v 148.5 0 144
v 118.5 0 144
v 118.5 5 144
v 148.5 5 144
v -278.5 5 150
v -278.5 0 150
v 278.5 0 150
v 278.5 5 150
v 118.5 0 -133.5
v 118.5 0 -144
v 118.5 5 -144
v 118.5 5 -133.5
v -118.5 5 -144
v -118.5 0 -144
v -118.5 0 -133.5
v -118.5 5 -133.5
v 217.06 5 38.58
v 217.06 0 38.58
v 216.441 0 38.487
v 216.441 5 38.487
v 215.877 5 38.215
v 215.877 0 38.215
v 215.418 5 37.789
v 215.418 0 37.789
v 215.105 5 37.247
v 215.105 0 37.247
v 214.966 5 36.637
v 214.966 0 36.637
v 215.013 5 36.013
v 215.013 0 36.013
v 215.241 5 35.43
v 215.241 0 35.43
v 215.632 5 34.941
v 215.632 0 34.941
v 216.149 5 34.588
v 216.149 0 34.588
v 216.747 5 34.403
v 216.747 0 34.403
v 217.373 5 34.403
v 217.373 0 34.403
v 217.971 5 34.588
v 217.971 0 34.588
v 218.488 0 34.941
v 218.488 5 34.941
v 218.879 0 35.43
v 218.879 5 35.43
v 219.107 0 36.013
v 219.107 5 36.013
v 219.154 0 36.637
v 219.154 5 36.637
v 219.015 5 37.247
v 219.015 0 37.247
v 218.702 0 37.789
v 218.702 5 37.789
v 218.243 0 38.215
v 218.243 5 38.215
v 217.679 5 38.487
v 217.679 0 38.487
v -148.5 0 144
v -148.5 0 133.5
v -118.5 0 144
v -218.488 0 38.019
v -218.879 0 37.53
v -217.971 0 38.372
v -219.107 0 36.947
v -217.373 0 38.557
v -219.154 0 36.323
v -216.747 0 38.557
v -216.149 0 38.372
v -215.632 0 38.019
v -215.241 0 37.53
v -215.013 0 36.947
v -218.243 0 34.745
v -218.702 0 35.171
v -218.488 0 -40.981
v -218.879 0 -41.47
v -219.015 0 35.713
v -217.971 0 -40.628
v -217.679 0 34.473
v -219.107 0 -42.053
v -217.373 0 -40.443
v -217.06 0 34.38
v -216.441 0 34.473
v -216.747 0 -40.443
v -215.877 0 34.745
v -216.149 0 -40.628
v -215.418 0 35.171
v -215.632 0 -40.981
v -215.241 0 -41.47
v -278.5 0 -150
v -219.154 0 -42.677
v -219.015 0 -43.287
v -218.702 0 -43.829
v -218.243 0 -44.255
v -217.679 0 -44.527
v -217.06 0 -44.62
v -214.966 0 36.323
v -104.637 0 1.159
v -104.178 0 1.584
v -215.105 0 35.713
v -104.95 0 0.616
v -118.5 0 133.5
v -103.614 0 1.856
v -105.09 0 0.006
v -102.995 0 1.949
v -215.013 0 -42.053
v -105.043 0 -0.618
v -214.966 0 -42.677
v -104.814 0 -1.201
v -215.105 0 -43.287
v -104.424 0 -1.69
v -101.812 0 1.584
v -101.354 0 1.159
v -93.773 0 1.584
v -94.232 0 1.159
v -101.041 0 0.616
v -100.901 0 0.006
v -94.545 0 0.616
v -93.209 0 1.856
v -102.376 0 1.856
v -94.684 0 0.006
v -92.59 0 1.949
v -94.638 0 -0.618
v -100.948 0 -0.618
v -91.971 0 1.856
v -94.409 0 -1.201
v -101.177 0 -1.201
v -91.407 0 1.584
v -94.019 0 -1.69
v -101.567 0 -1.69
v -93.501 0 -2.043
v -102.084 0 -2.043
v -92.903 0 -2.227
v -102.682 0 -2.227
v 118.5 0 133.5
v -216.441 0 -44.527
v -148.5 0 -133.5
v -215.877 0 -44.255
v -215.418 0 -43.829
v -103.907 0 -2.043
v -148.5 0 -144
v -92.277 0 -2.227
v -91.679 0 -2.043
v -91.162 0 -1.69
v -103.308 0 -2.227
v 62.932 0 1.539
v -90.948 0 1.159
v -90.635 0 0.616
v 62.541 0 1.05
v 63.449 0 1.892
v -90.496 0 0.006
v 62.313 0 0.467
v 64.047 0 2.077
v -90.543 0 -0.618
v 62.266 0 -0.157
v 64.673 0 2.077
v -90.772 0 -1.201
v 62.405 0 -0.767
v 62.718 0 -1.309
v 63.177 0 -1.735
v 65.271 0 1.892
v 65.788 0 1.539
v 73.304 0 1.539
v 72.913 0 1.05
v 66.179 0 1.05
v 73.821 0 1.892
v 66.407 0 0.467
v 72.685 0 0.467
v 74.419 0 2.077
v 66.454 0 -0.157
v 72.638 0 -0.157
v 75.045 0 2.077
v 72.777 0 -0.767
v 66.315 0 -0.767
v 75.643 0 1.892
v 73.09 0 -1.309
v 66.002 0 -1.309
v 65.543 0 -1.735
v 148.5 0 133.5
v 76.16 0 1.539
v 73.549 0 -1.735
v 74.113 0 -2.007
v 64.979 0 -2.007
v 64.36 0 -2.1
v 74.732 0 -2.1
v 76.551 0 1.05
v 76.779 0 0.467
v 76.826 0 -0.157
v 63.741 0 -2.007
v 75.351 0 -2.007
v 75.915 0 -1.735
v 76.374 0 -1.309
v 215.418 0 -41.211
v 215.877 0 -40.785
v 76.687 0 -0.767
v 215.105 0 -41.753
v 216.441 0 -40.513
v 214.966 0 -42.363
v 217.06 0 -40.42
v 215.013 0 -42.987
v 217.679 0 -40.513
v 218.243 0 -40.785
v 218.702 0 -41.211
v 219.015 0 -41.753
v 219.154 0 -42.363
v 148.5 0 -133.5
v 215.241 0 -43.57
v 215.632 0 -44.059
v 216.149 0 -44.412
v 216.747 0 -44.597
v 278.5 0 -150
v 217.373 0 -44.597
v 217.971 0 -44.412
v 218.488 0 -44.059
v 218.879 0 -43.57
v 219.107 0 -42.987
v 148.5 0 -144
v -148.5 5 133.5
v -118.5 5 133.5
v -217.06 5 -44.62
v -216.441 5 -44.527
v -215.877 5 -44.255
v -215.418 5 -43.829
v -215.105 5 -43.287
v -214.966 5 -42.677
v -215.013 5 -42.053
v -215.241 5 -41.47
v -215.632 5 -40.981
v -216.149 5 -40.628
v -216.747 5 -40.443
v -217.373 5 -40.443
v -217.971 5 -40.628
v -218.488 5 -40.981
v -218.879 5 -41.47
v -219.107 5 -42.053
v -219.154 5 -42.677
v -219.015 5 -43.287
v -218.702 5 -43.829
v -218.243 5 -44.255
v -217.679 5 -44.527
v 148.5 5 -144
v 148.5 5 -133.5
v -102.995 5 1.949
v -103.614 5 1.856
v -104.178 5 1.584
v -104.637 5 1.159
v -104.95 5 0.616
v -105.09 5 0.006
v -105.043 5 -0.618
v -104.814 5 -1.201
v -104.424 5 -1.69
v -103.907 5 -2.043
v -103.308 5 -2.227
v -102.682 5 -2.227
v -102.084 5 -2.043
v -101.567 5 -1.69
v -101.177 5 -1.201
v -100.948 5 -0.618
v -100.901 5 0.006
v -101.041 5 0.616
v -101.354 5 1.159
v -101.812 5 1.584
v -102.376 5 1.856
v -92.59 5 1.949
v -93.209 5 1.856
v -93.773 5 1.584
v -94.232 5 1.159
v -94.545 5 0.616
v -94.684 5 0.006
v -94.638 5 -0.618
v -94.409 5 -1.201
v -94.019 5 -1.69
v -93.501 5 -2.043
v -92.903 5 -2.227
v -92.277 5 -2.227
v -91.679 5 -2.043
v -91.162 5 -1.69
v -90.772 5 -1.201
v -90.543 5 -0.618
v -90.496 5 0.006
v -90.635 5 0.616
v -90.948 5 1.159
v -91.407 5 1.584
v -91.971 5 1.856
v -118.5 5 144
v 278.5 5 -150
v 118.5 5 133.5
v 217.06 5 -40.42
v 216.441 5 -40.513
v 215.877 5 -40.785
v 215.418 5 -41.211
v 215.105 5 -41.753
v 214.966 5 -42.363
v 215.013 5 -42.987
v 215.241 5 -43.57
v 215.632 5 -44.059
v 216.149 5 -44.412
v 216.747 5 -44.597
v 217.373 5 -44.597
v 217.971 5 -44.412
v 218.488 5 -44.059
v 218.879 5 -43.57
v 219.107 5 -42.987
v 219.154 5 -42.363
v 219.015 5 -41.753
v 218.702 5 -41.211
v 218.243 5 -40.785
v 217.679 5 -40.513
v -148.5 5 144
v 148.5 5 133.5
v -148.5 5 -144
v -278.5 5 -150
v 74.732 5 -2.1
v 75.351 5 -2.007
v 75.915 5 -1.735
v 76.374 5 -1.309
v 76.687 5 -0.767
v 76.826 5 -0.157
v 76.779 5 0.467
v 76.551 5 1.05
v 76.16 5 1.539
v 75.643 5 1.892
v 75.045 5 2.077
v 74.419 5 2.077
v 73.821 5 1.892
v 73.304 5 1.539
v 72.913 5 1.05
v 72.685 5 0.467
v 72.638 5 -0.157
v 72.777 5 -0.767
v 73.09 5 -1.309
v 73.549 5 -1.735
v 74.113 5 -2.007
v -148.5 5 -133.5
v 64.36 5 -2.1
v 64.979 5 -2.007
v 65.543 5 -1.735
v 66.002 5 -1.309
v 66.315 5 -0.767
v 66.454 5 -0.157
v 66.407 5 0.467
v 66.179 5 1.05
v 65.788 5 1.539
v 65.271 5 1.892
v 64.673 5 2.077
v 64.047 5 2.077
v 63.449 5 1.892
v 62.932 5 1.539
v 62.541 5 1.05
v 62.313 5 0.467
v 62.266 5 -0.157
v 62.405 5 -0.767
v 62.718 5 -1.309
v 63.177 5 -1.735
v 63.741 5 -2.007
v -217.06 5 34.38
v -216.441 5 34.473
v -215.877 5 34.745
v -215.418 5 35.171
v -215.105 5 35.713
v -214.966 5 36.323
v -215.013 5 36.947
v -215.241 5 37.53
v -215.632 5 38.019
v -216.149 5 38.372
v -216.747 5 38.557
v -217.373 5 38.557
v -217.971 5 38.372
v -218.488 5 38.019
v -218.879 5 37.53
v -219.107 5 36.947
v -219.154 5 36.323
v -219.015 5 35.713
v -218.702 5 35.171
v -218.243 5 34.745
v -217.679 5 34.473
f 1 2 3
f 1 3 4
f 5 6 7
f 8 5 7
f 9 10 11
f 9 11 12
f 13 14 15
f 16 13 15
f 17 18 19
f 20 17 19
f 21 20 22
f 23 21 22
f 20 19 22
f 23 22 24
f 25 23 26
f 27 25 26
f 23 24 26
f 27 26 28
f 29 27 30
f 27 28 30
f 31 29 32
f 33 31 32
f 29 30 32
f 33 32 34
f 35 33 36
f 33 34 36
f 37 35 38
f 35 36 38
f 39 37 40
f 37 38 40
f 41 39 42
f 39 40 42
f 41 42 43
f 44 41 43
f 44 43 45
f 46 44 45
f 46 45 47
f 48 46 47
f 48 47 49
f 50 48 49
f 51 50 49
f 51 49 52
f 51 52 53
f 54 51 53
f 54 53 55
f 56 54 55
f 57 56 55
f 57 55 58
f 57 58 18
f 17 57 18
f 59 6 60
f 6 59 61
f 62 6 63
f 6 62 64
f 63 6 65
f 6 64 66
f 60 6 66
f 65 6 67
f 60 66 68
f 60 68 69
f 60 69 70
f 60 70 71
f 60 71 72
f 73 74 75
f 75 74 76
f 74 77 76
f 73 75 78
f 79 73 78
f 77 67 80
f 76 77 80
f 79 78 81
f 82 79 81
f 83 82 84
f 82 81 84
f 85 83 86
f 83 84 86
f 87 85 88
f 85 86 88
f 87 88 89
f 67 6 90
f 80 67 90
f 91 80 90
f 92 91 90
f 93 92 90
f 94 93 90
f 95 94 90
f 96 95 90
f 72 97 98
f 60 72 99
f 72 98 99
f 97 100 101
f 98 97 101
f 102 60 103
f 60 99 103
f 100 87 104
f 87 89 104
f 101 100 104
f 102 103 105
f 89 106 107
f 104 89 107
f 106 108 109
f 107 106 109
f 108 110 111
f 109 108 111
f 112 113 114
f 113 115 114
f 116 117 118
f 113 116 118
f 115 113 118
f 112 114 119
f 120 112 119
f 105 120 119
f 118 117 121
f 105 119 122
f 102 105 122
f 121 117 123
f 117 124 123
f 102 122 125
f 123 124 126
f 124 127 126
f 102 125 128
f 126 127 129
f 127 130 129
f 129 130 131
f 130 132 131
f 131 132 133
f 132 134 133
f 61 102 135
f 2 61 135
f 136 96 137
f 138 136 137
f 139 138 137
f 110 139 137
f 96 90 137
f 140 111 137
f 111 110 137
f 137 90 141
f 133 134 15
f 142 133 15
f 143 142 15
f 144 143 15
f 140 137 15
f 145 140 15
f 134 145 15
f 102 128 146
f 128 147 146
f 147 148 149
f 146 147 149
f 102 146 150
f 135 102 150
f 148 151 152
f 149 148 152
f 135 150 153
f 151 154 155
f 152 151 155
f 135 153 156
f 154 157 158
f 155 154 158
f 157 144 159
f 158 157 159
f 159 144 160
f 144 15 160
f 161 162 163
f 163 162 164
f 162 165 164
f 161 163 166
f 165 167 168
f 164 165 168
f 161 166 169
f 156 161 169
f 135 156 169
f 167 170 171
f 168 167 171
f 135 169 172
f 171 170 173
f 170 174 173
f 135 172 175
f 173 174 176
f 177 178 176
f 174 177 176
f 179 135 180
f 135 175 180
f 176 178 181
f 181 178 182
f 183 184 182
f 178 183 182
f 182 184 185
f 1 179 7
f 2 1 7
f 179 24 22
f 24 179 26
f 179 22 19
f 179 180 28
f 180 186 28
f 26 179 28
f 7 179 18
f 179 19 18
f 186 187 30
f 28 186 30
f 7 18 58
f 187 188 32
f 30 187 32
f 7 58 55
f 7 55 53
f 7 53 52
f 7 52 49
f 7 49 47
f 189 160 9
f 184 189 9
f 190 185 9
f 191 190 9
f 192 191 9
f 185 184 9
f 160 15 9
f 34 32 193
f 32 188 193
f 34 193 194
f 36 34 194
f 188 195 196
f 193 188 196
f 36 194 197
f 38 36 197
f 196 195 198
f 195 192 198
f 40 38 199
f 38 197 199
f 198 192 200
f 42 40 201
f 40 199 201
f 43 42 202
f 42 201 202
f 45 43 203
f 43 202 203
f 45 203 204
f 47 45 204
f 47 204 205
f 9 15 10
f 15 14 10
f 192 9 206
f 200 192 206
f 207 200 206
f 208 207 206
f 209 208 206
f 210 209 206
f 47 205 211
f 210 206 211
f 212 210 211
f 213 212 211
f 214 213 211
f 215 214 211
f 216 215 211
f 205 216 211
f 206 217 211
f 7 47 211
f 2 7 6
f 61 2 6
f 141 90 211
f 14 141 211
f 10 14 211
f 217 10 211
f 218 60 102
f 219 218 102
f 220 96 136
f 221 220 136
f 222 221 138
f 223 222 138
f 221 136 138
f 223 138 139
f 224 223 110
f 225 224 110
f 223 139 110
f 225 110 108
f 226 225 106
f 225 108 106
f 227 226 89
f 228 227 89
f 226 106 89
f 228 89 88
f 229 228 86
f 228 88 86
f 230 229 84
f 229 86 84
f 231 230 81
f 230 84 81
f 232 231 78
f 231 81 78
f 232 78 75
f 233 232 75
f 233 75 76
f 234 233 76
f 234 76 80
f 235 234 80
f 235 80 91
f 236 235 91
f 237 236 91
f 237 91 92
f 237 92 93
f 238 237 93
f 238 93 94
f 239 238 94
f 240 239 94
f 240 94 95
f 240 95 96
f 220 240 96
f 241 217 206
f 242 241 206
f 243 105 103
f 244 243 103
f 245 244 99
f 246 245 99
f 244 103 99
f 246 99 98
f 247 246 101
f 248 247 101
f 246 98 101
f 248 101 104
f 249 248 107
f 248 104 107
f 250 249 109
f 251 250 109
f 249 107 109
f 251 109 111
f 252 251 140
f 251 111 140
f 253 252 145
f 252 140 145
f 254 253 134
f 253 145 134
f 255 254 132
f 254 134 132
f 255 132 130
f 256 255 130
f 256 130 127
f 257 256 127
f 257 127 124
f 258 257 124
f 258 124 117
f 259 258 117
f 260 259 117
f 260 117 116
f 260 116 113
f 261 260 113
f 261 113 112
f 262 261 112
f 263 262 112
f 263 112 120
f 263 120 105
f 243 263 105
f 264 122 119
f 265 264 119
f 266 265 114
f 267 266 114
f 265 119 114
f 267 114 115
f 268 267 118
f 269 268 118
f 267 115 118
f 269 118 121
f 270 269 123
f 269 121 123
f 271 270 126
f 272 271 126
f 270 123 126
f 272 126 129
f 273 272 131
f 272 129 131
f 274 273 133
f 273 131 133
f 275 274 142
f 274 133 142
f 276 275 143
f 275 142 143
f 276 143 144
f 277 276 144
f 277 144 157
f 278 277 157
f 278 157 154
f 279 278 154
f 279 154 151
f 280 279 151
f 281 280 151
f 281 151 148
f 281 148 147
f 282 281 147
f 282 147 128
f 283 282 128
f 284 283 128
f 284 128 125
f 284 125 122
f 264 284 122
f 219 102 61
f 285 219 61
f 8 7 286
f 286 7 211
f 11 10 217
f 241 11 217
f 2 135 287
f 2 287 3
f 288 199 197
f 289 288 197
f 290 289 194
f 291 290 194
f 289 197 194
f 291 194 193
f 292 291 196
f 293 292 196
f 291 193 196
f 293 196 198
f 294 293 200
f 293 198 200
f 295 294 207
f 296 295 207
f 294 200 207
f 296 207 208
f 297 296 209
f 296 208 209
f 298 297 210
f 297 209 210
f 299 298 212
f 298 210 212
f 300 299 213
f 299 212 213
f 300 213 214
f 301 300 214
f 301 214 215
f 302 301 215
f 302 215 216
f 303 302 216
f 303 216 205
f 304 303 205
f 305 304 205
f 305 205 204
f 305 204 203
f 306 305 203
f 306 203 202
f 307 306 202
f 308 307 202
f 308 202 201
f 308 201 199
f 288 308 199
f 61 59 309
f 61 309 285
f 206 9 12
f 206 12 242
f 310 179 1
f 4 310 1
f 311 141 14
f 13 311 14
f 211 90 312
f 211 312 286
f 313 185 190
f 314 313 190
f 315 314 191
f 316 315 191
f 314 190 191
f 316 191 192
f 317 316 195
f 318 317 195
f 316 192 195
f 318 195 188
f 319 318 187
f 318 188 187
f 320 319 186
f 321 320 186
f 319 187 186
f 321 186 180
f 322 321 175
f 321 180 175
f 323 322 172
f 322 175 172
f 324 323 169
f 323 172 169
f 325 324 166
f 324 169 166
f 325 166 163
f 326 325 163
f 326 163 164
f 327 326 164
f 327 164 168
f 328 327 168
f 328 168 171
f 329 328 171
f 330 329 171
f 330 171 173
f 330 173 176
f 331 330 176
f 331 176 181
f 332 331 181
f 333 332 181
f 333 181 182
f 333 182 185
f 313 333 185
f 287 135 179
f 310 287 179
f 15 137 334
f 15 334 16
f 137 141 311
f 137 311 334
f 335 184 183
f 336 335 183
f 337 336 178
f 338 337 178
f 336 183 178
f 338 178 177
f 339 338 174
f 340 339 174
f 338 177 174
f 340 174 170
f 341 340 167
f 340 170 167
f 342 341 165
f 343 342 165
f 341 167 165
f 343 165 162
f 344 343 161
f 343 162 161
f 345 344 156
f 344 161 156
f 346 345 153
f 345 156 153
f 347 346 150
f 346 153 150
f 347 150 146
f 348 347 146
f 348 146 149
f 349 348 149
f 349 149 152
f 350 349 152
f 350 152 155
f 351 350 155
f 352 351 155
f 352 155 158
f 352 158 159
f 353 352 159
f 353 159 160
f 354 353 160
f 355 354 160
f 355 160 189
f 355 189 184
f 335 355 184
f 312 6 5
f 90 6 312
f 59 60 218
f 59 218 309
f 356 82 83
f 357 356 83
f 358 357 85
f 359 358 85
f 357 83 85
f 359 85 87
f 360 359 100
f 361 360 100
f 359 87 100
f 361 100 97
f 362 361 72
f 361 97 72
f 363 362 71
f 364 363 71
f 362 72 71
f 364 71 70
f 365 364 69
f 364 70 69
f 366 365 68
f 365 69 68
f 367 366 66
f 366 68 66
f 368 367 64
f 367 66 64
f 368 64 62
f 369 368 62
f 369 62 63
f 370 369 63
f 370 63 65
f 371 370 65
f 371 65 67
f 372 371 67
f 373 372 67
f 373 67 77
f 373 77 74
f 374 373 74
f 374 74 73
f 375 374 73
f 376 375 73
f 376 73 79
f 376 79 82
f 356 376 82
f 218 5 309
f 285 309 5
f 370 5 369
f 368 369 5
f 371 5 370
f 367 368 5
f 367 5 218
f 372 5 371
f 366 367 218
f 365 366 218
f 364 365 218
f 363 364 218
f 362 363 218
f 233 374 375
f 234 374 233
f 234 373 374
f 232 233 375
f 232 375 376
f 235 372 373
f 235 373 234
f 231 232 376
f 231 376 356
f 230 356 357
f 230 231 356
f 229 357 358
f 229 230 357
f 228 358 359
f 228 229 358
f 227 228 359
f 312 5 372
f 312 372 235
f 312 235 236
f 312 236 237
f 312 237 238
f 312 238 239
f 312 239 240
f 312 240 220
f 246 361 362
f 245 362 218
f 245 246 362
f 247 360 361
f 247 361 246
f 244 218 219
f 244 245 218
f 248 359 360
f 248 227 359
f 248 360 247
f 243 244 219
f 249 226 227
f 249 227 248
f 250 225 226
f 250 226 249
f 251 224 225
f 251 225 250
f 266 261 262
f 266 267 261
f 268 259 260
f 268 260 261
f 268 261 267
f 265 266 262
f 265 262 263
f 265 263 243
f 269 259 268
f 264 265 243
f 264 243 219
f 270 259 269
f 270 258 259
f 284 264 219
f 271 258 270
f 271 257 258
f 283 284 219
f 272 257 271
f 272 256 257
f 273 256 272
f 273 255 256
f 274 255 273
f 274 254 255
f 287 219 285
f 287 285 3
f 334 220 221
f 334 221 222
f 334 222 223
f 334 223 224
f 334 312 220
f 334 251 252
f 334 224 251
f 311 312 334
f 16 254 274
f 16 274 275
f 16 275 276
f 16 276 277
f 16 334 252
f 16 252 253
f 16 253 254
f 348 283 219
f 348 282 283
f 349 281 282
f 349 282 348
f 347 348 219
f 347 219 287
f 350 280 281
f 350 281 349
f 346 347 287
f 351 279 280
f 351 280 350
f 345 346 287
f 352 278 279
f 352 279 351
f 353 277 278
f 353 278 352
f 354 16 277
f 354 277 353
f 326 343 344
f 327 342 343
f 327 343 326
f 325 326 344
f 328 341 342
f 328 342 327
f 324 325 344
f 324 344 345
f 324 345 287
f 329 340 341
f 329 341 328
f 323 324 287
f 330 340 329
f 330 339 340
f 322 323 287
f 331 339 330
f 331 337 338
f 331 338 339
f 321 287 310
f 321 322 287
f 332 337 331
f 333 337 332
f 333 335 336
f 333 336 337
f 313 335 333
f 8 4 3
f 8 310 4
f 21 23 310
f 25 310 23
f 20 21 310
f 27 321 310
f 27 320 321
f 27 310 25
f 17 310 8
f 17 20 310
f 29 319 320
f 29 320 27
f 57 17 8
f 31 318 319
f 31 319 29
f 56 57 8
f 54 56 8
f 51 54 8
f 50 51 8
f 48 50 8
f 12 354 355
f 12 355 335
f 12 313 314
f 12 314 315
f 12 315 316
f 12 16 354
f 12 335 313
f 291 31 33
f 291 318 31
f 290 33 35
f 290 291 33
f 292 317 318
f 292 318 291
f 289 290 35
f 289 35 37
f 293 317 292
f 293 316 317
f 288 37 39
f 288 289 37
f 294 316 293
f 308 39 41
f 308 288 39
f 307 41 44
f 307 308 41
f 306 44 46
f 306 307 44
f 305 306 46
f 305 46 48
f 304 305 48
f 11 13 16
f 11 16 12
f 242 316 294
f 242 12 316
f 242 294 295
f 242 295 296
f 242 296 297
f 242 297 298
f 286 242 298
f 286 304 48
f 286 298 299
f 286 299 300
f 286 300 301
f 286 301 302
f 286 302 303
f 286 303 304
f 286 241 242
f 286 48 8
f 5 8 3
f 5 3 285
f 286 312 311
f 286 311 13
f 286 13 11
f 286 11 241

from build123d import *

# Parameters (mm, degrees)
SKETCH1_W           = 557
SKETCH1_H           = 300
BOSS_EXTRUDE1_DEPTH = 5
SKETCH2_R           = 2.1
CUT_EXTRUDE1_DEPTH  = 10
SKETCH3_R           = 2.1
CUT_EXTRUDE2_DEPTH  = 10
SKETCH4_W           = 30
SKETCH4_H           = 10.5
CUT_EXTRUDE3_DEPTH  = 10


with BuildPart() as part:
    # Sketch1 → Boss-Extrude1 (new body)
    with BuildSketch(Plane(origin=(0, 0, 0), x_dir=(1, 0, 0), z_dir=(0, 1, 0))):
        Rectangle(SKETCH1_W, SKETCH1_H)
    extrude(amount=BOSS_EXTRUDE1_DEPTH)

    # Sketch2 → Cut-Extrude1 (cut)
    with BuildSketch(Plane.XZ):
        with Locations(Location((64.36, 0, 0), (0, 0, 270))):
            Circle(SKETCH2_R)
        with Locations(Location((74.731926732, 0, 0), (0, 0, 270))):
            Circle(SKETCH2_R)
        with Locations(Location((-92.590200896, -0.150780626, 0), (0, 0, 90))):
            Circle(SKETCH2_R)
        with Locations(Location((-102.995469166, -0.150780626, 0), (0, 0, 90))):
            Circle(SKETCH2_R)
    extrude(amount=-CUT_EXTRUDE1_DEPTH, mode=Mode.SUBTRACT)

    # Sketch3 → Cut-Extrude2 (cut)
    with BuildSketch(Plane.XZ):
        with Locations(Location((-217.06, -42.52, 0), (0, 0, 270))):
            Circle(SKETCH3_R)
        with Locations(Location((-217.06, 36.48, 0), (0, 0, 270))):
            Circle(SKETCH3_R)
        with Locations(Location((217.06, 36.48, 0), (0, 0, 90))):
            Circle(SKETCH3_R)
        with Locations(Location((217.06, -42.52, 0), (0, 0, 90))):
            Circle(SKETCH3_R)
    extrude(amount=-CUT_EXTRUDE2_DEPTH, mode=Mode.SUBTRACT)

    # Sketch4 → Cut-Extrude3 (cut)
    with BuildSketch(Plane.XZ):
        with Locations((133.5, 138.75)):
            Rectangle(SKETCH4_W, SKETCH4_H)
        with Locations((-133.5, 138.75)):
            Rectangle(SKETCH4_W, SKETCH4_H)
        with Locations((-133.5, -138.75)):
            Rectangle(SKETCH4_W, SKETCH4_H)
        with Locations((133.5, -138.75)):
            Rectangle(SKETCH4_W, SKETCH4_H)
    extrude(amount=-CUT_EXTRUDE3_DEPTH, mode=Mode.SUBTRACT)


solid = part.part
